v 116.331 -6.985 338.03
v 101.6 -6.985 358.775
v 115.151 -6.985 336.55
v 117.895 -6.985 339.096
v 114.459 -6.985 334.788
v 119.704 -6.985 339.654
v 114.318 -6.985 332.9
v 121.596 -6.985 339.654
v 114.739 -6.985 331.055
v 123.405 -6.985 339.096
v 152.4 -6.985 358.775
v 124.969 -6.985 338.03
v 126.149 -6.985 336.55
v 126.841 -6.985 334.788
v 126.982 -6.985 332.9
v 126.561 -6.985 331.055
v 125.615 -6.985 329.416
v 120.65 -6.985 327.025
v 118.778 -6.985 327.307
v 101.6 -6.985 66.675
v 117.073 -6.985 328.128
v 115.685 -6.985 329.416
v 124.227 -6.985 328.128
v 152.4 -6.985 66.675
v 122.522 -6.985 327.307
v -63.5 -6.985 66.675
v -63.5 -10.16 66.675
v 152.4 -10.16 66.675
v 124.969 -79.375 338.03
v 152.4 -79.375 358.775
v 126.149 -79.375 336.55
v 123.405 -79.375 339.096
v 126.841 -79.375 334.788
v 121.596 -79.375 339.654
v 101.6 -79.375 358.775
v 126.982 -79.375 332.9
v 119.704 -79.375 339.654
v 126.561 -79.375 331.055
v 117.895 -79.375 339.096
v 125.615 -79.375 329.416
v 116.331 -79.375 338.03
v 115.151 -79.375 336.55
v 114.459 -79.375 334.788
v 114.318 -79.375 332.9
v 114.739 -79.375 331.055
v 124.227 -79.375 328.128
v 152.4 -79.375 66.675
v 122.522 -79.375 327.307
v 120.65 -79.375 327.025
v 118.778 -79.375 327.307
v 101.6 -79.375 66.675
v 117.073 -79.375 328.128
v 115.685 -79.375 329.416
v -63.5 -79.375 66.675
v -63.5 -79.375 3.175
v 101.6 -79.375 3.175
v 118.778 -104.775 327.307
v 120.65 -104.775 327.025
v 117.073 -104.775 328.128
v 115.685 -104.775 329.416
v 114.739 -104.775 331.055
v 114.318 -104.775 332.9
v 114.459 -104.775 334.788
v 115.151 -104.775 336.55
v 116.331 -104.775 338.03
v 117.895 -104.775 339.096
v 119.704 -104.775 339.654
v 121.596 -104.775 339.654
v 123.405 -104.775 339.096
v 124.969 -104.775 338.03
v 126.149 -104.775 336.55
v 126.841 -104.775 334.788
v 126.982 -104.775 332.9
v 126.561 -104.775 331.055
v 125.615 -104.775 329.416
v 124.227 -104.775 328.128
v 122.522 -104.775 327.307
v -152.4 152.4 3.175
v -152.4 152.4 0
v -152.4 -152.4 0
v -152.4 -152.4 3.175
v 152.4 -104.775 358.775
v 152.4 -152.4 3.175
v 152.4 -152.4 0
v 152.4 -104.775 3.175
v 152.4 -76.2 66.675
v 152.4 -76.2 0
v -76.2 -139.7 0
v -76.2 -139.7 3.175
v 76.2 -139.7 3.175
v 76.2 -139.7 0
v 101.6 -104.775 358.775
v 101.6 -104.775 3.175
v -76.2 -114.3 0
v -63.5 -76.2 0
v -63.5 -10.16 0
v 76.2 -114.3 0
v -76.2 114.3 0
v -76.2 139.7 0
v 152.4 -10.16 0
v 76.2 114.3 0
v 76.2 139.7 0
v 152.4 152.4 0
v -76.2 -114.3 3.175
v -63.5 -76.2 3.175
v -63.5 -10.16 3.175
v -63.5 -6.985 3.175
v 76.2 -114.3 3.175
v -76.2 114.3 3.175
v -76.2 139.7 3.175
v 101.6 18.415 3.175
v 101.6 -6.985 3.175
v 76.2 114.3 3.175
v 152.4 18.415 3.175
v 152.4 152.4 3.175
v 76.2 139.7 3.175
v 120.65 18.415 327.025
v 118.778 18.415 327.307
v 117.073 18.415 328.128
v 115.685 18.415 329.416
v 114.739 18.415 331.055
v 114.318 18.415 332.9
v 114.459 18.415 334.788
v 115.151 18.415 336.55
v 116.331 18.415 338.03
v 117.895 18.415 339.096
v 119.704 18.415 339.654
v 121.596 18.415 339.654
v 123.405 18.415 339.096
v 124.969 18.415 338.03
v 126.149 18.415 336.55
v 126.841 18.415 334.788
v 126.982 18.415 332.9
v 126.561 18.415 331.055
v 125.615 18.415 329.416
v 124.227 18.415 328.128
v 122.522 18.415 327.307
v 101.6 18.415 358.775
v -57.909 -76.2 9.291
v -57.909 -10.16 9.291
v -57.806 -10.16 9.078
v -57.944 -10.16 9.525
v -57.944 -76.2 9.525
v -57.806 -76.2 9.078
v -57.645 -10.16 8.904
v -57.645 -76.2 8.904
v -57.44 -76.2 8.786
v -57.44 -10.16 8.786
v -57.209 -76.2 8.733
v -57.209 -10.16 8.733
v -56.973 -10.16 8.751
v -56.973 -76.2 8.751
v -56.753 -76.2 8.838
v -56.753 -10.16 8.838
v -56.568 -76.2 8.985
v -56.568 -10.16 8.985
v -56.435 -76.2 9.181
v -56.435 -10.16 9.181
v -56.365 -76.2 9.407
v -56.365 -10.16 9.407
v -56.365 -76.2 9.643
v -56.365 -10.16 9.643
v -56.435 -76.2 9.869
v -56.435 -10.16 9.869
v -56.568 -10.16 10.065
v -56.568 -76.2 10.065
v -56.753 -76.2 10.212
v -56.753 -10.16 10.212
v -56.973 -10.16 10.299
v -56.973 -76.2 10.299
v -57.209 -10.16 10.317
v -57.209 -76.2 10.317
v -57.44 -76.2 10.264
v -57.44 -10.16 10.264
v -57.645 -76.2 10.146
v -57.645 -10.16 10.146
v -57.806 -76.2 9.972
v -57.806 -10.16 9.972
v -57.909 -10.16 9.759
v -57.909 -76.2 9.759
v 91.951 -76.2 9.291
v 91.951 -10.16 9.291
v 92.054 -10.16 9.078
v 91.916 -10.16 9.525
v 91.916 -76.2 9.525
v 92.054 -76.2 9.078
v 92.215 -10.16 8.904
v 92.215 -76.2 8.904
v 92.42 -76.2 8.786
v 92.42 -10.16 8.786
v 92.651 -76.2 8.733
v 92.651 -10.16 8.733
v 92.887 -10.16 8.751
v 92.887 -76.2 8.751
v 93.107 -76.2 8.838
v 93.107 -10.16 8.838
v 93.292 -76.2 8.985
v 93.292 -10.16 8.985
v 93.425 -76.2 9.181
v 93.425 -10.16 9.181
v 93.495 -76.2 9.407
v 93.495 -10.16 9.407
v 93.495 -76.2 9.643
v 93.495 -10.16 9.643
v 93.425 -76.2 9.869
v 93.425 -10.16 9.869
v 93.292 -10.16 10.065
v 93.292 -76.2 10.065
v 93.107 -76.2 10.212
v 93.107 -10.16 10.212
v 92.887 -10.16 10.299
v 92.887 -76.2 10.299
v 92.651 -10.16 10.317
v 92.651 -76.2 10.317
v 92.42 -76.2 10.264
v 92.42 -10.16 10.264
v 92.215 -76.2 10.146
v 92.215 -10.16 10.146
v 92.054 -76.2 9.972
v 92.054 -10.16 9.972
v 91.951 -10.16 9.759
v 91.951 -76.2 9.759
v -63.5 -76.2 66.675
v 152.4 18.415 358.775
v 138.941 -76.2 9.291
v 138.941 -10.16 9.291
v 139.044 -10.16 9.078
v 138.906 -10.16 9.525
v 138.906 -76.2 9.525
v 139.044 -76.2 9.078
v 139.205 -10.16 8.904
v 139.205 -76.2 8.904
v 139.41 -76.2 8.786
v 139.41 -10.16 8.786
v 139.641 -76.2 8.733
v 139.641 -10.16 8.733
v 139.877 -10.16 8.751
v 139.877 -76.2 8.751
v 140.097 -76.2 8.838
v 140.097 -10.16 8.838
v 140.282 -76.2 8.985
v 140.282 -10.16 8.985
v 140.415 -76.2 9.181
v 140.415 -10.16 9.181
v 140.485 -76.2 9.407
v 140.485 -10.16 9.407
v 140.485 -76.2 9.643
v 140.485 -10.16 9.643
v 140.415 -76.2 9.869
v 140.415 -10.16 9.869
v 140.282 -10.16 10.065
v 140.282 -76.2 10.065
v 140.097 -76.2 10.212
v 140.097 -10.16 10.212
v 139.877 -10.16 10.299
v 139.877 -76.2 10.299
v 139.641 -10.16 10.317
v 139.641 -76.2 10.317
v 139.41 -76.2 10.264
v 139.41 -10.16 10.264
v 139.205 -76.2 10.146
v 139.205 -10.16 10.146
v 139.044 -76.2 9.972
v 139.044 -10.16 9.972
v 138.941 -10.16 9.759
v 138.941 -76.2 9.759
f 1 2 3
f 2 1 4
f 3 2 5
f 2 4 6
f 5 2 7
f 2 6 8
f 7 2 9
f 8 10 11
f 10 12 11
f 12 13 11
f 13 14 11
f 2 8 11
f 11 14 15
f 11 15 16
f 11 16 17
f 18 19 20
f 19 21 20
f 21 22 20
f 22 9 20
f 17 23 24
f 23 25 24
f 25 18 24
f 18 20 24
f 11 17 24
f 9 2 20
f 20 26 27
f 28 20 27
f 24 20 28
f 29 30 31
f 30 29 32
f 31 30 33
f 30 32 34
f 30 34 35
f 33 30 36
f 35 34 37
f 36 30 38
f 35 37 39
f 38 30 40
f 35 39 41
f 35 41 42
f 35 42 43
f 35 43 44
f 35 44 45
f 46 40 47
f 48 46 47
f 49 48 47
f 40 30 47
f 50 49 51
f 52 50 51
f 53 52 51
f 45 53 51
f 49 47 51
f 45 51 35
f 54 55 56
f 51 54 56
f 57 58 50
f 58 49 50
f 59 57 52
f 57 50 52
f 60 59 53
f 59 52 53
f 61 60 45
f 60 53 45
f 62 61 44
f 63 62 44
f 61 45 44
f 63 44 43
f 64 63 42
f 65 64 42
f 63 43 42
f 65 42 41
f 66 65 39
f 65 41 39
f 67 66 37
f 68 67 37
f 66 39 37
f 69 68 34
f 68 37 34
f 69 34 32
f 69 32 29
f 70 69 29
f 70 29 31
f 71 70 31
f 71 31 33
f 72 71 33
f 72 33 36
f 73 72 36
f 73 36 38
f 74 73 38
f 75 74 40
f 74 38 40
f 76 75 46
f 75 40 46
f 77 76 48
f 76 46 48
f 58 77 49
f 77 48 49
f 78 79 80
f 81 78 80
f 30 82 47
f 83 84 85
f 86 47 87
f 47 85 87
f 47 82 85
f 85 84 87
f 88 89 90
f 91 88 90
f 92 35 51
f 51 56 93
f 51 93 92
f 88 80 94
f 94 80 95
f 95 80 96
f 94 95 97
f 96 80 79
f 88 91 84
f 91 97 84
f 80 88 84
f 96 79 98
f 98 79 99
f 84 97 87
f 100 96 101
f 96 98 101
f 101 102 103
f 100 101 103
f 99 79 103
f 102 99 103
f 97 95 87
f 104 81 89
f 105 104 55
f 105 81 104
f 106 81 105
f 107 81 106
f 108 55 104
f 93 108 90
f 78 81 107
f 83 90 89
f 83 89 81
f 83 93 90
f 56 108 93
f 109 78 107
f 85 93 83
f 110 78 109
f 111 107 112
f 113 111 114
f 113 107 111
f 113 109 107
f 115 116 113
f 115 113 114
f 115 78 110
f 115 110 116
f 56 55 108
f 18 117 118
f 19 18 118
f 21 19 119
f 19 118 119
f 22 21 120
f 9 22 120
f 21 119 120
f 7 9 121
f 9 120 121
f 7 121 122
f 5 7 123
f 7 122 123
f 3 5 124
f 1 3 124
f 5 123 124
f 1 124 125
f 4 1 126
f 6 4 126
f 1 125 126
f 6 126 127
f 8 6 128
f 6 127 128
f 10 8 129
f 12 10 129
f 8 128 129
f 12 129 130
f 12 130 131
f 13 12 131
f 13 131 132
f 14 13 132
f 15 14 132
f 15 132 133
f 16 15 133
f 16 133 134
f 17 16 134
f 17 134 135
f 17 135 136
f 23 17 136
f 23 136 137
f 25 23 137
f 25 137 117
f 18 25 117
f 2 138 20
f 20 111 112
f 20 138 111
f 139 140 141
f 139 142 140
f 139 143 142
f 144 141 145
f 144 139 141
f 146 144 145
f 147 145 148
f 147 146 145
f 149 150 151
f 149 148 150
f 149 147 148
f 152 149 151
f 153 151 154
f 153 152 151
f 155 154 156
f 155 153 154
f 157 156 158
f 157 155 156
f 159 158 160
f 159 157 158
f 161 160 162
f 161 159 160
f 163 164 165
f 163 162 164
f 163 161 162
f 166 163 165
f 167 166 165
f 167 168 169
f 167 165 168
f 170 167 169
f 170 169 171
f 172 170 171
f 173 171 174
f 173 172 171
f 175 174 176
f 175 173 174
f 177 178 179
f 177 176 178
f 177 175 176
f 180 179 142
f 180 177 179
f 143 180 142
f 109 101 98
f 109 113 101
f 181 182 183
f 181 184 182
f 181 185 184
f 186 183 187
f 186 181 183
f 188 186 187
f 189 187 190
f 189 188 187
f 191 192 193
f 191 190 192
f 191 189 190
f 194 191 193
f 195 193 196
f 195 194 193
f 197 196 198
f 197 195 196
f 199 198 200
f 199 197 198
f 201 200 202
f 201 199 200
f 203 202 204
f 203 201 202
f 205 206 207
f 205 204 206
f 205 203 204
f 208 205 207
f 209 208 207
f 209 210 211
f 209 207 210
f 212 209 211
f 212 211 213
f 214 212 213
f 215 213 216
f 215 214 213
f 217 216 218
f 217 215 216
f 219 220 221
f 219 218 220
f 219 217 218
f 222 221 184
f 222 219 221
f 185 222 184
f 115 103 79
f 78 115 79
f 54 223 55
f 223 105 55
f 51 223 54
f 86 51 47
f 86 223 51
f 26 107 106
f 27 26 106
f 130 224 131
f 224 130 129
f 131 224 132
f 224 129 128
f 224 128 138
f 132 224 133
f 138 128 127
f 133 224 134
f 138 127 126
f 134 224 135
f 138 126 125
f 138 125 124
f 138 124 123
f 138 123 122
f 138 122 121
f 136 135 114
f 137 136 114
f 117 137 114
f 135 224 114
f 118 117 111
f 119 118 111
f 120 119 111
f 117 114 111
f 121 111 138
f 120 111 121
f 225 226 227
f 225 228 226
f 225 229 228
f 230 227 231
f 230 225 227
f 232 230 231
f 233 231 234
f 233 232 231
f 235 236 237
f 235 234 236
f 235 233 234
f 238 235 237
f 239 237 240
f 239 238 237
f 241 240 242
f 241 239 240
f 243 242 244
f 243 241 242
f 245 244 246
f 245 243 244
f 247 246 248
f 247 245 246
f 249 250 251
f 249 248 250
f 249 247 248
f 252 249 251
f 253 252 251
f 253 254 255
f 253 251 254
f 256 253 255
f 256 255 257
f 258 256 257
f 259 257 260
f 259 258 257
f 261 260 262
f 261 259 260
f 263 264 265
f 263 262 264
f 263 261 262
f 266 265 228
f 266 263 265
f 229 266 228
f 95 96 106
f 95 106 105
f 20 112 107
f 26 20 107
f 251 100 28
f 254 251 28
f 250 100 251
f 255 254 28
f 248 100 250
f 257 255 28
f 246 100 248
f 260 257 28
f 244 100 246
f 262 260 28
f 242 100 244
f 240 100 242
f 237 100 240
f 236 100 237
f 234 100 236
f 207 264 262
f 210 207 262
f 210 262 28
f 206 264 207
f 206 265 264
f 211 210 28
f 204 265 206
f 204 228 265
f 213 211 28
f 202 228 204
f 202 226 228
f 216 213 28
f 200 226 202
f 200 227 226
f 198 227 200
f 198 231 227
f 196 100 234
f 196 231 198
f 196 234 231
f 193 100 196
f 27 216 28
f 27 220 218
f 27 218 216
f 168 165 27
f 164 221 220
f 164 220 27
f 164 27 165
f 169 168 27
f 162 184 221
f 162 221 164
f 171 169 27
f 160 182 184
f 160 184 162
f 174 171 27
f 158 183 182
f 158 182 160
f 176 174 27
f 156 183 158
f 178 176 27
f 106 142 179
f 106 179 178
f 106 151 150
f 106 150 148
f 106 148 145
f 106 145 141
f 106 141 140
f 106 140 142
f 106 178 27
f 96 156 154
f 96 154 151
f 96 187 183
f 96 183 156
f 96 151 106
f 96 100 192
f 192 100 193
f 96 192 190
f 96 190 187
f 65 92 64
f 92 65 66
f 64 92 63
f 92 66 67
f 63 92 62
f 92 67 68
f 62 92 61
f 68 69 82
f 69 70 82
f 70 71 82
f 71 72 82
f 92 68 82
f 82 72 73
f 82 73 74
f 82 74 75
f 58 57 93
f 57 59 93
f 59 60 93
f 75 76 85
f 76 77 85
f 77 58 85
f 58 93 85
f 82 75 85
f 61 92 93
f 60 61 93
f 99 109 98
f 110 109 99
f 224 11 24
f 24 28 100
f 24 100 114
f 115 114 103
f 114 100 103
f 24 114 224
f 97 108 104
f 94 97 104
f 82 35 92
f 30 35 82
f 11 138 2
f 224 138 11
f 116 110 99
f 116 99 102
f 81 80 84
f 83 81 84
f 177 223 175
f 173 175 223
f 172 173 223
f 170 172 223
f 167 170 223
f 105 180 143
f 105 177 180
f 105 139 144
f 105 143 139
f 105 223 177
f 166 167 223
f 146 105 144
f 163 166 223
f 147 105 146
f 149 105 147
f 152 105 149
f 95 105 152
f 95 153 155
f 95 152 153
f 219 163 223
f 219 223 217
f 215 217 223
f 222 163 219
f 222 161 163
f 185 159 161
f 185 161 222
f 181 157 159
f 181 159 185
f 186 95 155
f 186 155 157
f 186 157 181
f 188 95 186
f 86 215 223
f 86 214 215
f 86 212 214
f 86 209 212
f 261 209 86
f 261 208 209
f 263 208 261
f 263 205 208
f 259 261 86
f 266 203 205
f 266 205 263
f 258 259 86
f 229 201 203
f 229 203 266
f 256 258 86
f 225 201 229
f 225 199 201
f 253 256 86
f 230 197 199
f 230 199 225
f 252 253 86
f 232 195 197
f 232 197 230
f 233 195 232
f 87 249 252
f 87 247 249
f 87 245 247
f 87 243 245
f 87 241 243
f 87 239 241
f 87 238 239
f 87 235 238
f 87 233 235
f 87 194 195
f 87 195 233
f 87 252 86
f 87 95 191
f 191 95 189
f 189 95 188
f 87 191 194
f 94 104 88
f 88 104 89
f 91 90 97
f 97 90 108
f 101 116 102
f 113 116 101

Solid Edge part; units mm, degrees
sketch "Sketch1" plane through (0, 0, 0) normal (0, 0, 1) x (1, 0, 0)
  line L0 (-152.4, -152.4) -> (152.4, -152.4)
  line L1 (152.4, -152.4) -> (152.4, -76.2)
  line L2 (-63.5, -76.2) -> (152.4, -76.2)
  line L3 (-63.5, -10.16) -> (-63.5, -76.2)
  line L4 (152.4, -10.16) -> (-63.5, -10.16)
  line L5 (152.4, -10.16) -> (152.4, 152.4)
  line L6 (152.4, 152.4) -> (-152.4, 152.4)
  line L7 (-152.4, 152.4) -> (-152.4, -152.4)
extrude "Protrusion1" add sketch "Sketch1" along normal blind 3.175
sketch "Sketch2" plane through (0, 0, 3.175) normal (0, 0, 1) x (0, 1, 0)
  line L0 (-79.375, -152.4) -> (-76.2, -152.4)
  line L1 (-76.2, -152.4) -> (-76.2, 63.5)
  line L2 (-76.2, 63.5) -> (-79.375, 63.5)
  line L3 (-79.375, 63.5) -> (-79.375, -152.4)
  line L4 (-10.16, -152.4) -> (-6.985, -152.4)
  line L5 (-6.985, -152.4) -> (-6.985, 63.5)
  line L6 (-6.985, 63.5) -> (-10.16, 63.5)
  line L7 (-10.16, 63.5) -> (-10.16, -152.4)
  dimension "D1" = 3.175
  dimension "D2" = 3.175
extrude "ExtrudedProtrusion_2" add sketch "Sketch2" along normal blind 63.5
sketch "Sketch3" plane through (0, 0, 3.175) normal (0, 0, 1) x (0, 1, 0)
  line L0 (139.7, -76.2) -> (114.3, -76.2)
  line L1 (114.3, -76.2) -> (114.3, 76.2)
  line L2 (114.3, 76.2) -> (139.7, 76.2)
  line L3 (139.7, 76.2) -> (139.7, -76.2)
  line L4 (-139.7, -76.2) -> (-114.3, -76.2)
  line L5 (-114.3, -76.2) -> (-114.3, 76.2)
  line L6 (-114.3, 76.2) -> (-139.7, 76.2)
  line L7 (-139.7, 76.2) -> (-139.7, -76.2)
  dimension "D1" = 25.4
  dimension "D2" = 152.4
  dimension "D3" = 12.7
  dimension "D4" = 76.2
  dimension "D5" = 25.4
  dimension "D6" = 152.4
  dimension "D7" = 292.1
  dimension "D8" = 76.2
extrude "Cutout1" cut sketch "Sketch3" against normal through all
sketch "Sketch4" plane through (44.45, -76.2, 33.3375) normal (0, 1, 0) x (-1, 0, 0)
  circle A0 centre (-48.26, -23.8125) radius 0.7938
  circle A1 centre (101.6, -23.8125) radius 0.7938
  circle A2 centre (-95.25, -23.8125) radius 0.7938
  dimension "D1" = 6.35
  dimension "D2" = 6.35
  dimension "D3" = 6.35
  dimension "D4" = 12.7
  dimension "D5" = 6.35
  dimension "D6" = 156.21
extrude "ExtrudedProtrusion_3" add sketch "Sketch4" along normal blind 66.04
sketch "Sketch5" plane through (0, 0, 3.175) normal (0, 0, 1) x (0, 1, 0)
  line L0 (-104.775, -152.4) -> (-79.375, -152.4)
  line L1 (-79.375, -152.4) -> (-79.375, -101.6)
  line L2 (-79.375, -101.6) -> (-104.775, -101.6)
  line L3 (-104.775, -101.6) -> (-104.775, -152.4)
  line L4 (-6.985, -152.4) -> (18.415, -152.4)
  line L5 (18.415, -152.4) -> (18.415, -101.6)
  line L6 (18.415, -101.6) -> (-6.985, -101.6)
  line L7 (-6.985, -101.6) -> (-6.985, -152.4)
  dimension "D1" = 25.4
  dimension "D2" = 50.8
  dimension "D3" = 25.4
  dimension "D4" = 50.8
extrude "ExtrudedProtrusion_4" add sketch "Sketch5" along normal blind 355.6
sketch "Sketch6" plane through (120.65, 61.595, 180.975) normal (0, 1, 0) x (0, 0, -1)
  circle A0 centre (-152.4, 0) radius 6.35
  dimension "D1" = 25.4
extrude "Cutout2" cut sketch "Sketch6" against normal through all
